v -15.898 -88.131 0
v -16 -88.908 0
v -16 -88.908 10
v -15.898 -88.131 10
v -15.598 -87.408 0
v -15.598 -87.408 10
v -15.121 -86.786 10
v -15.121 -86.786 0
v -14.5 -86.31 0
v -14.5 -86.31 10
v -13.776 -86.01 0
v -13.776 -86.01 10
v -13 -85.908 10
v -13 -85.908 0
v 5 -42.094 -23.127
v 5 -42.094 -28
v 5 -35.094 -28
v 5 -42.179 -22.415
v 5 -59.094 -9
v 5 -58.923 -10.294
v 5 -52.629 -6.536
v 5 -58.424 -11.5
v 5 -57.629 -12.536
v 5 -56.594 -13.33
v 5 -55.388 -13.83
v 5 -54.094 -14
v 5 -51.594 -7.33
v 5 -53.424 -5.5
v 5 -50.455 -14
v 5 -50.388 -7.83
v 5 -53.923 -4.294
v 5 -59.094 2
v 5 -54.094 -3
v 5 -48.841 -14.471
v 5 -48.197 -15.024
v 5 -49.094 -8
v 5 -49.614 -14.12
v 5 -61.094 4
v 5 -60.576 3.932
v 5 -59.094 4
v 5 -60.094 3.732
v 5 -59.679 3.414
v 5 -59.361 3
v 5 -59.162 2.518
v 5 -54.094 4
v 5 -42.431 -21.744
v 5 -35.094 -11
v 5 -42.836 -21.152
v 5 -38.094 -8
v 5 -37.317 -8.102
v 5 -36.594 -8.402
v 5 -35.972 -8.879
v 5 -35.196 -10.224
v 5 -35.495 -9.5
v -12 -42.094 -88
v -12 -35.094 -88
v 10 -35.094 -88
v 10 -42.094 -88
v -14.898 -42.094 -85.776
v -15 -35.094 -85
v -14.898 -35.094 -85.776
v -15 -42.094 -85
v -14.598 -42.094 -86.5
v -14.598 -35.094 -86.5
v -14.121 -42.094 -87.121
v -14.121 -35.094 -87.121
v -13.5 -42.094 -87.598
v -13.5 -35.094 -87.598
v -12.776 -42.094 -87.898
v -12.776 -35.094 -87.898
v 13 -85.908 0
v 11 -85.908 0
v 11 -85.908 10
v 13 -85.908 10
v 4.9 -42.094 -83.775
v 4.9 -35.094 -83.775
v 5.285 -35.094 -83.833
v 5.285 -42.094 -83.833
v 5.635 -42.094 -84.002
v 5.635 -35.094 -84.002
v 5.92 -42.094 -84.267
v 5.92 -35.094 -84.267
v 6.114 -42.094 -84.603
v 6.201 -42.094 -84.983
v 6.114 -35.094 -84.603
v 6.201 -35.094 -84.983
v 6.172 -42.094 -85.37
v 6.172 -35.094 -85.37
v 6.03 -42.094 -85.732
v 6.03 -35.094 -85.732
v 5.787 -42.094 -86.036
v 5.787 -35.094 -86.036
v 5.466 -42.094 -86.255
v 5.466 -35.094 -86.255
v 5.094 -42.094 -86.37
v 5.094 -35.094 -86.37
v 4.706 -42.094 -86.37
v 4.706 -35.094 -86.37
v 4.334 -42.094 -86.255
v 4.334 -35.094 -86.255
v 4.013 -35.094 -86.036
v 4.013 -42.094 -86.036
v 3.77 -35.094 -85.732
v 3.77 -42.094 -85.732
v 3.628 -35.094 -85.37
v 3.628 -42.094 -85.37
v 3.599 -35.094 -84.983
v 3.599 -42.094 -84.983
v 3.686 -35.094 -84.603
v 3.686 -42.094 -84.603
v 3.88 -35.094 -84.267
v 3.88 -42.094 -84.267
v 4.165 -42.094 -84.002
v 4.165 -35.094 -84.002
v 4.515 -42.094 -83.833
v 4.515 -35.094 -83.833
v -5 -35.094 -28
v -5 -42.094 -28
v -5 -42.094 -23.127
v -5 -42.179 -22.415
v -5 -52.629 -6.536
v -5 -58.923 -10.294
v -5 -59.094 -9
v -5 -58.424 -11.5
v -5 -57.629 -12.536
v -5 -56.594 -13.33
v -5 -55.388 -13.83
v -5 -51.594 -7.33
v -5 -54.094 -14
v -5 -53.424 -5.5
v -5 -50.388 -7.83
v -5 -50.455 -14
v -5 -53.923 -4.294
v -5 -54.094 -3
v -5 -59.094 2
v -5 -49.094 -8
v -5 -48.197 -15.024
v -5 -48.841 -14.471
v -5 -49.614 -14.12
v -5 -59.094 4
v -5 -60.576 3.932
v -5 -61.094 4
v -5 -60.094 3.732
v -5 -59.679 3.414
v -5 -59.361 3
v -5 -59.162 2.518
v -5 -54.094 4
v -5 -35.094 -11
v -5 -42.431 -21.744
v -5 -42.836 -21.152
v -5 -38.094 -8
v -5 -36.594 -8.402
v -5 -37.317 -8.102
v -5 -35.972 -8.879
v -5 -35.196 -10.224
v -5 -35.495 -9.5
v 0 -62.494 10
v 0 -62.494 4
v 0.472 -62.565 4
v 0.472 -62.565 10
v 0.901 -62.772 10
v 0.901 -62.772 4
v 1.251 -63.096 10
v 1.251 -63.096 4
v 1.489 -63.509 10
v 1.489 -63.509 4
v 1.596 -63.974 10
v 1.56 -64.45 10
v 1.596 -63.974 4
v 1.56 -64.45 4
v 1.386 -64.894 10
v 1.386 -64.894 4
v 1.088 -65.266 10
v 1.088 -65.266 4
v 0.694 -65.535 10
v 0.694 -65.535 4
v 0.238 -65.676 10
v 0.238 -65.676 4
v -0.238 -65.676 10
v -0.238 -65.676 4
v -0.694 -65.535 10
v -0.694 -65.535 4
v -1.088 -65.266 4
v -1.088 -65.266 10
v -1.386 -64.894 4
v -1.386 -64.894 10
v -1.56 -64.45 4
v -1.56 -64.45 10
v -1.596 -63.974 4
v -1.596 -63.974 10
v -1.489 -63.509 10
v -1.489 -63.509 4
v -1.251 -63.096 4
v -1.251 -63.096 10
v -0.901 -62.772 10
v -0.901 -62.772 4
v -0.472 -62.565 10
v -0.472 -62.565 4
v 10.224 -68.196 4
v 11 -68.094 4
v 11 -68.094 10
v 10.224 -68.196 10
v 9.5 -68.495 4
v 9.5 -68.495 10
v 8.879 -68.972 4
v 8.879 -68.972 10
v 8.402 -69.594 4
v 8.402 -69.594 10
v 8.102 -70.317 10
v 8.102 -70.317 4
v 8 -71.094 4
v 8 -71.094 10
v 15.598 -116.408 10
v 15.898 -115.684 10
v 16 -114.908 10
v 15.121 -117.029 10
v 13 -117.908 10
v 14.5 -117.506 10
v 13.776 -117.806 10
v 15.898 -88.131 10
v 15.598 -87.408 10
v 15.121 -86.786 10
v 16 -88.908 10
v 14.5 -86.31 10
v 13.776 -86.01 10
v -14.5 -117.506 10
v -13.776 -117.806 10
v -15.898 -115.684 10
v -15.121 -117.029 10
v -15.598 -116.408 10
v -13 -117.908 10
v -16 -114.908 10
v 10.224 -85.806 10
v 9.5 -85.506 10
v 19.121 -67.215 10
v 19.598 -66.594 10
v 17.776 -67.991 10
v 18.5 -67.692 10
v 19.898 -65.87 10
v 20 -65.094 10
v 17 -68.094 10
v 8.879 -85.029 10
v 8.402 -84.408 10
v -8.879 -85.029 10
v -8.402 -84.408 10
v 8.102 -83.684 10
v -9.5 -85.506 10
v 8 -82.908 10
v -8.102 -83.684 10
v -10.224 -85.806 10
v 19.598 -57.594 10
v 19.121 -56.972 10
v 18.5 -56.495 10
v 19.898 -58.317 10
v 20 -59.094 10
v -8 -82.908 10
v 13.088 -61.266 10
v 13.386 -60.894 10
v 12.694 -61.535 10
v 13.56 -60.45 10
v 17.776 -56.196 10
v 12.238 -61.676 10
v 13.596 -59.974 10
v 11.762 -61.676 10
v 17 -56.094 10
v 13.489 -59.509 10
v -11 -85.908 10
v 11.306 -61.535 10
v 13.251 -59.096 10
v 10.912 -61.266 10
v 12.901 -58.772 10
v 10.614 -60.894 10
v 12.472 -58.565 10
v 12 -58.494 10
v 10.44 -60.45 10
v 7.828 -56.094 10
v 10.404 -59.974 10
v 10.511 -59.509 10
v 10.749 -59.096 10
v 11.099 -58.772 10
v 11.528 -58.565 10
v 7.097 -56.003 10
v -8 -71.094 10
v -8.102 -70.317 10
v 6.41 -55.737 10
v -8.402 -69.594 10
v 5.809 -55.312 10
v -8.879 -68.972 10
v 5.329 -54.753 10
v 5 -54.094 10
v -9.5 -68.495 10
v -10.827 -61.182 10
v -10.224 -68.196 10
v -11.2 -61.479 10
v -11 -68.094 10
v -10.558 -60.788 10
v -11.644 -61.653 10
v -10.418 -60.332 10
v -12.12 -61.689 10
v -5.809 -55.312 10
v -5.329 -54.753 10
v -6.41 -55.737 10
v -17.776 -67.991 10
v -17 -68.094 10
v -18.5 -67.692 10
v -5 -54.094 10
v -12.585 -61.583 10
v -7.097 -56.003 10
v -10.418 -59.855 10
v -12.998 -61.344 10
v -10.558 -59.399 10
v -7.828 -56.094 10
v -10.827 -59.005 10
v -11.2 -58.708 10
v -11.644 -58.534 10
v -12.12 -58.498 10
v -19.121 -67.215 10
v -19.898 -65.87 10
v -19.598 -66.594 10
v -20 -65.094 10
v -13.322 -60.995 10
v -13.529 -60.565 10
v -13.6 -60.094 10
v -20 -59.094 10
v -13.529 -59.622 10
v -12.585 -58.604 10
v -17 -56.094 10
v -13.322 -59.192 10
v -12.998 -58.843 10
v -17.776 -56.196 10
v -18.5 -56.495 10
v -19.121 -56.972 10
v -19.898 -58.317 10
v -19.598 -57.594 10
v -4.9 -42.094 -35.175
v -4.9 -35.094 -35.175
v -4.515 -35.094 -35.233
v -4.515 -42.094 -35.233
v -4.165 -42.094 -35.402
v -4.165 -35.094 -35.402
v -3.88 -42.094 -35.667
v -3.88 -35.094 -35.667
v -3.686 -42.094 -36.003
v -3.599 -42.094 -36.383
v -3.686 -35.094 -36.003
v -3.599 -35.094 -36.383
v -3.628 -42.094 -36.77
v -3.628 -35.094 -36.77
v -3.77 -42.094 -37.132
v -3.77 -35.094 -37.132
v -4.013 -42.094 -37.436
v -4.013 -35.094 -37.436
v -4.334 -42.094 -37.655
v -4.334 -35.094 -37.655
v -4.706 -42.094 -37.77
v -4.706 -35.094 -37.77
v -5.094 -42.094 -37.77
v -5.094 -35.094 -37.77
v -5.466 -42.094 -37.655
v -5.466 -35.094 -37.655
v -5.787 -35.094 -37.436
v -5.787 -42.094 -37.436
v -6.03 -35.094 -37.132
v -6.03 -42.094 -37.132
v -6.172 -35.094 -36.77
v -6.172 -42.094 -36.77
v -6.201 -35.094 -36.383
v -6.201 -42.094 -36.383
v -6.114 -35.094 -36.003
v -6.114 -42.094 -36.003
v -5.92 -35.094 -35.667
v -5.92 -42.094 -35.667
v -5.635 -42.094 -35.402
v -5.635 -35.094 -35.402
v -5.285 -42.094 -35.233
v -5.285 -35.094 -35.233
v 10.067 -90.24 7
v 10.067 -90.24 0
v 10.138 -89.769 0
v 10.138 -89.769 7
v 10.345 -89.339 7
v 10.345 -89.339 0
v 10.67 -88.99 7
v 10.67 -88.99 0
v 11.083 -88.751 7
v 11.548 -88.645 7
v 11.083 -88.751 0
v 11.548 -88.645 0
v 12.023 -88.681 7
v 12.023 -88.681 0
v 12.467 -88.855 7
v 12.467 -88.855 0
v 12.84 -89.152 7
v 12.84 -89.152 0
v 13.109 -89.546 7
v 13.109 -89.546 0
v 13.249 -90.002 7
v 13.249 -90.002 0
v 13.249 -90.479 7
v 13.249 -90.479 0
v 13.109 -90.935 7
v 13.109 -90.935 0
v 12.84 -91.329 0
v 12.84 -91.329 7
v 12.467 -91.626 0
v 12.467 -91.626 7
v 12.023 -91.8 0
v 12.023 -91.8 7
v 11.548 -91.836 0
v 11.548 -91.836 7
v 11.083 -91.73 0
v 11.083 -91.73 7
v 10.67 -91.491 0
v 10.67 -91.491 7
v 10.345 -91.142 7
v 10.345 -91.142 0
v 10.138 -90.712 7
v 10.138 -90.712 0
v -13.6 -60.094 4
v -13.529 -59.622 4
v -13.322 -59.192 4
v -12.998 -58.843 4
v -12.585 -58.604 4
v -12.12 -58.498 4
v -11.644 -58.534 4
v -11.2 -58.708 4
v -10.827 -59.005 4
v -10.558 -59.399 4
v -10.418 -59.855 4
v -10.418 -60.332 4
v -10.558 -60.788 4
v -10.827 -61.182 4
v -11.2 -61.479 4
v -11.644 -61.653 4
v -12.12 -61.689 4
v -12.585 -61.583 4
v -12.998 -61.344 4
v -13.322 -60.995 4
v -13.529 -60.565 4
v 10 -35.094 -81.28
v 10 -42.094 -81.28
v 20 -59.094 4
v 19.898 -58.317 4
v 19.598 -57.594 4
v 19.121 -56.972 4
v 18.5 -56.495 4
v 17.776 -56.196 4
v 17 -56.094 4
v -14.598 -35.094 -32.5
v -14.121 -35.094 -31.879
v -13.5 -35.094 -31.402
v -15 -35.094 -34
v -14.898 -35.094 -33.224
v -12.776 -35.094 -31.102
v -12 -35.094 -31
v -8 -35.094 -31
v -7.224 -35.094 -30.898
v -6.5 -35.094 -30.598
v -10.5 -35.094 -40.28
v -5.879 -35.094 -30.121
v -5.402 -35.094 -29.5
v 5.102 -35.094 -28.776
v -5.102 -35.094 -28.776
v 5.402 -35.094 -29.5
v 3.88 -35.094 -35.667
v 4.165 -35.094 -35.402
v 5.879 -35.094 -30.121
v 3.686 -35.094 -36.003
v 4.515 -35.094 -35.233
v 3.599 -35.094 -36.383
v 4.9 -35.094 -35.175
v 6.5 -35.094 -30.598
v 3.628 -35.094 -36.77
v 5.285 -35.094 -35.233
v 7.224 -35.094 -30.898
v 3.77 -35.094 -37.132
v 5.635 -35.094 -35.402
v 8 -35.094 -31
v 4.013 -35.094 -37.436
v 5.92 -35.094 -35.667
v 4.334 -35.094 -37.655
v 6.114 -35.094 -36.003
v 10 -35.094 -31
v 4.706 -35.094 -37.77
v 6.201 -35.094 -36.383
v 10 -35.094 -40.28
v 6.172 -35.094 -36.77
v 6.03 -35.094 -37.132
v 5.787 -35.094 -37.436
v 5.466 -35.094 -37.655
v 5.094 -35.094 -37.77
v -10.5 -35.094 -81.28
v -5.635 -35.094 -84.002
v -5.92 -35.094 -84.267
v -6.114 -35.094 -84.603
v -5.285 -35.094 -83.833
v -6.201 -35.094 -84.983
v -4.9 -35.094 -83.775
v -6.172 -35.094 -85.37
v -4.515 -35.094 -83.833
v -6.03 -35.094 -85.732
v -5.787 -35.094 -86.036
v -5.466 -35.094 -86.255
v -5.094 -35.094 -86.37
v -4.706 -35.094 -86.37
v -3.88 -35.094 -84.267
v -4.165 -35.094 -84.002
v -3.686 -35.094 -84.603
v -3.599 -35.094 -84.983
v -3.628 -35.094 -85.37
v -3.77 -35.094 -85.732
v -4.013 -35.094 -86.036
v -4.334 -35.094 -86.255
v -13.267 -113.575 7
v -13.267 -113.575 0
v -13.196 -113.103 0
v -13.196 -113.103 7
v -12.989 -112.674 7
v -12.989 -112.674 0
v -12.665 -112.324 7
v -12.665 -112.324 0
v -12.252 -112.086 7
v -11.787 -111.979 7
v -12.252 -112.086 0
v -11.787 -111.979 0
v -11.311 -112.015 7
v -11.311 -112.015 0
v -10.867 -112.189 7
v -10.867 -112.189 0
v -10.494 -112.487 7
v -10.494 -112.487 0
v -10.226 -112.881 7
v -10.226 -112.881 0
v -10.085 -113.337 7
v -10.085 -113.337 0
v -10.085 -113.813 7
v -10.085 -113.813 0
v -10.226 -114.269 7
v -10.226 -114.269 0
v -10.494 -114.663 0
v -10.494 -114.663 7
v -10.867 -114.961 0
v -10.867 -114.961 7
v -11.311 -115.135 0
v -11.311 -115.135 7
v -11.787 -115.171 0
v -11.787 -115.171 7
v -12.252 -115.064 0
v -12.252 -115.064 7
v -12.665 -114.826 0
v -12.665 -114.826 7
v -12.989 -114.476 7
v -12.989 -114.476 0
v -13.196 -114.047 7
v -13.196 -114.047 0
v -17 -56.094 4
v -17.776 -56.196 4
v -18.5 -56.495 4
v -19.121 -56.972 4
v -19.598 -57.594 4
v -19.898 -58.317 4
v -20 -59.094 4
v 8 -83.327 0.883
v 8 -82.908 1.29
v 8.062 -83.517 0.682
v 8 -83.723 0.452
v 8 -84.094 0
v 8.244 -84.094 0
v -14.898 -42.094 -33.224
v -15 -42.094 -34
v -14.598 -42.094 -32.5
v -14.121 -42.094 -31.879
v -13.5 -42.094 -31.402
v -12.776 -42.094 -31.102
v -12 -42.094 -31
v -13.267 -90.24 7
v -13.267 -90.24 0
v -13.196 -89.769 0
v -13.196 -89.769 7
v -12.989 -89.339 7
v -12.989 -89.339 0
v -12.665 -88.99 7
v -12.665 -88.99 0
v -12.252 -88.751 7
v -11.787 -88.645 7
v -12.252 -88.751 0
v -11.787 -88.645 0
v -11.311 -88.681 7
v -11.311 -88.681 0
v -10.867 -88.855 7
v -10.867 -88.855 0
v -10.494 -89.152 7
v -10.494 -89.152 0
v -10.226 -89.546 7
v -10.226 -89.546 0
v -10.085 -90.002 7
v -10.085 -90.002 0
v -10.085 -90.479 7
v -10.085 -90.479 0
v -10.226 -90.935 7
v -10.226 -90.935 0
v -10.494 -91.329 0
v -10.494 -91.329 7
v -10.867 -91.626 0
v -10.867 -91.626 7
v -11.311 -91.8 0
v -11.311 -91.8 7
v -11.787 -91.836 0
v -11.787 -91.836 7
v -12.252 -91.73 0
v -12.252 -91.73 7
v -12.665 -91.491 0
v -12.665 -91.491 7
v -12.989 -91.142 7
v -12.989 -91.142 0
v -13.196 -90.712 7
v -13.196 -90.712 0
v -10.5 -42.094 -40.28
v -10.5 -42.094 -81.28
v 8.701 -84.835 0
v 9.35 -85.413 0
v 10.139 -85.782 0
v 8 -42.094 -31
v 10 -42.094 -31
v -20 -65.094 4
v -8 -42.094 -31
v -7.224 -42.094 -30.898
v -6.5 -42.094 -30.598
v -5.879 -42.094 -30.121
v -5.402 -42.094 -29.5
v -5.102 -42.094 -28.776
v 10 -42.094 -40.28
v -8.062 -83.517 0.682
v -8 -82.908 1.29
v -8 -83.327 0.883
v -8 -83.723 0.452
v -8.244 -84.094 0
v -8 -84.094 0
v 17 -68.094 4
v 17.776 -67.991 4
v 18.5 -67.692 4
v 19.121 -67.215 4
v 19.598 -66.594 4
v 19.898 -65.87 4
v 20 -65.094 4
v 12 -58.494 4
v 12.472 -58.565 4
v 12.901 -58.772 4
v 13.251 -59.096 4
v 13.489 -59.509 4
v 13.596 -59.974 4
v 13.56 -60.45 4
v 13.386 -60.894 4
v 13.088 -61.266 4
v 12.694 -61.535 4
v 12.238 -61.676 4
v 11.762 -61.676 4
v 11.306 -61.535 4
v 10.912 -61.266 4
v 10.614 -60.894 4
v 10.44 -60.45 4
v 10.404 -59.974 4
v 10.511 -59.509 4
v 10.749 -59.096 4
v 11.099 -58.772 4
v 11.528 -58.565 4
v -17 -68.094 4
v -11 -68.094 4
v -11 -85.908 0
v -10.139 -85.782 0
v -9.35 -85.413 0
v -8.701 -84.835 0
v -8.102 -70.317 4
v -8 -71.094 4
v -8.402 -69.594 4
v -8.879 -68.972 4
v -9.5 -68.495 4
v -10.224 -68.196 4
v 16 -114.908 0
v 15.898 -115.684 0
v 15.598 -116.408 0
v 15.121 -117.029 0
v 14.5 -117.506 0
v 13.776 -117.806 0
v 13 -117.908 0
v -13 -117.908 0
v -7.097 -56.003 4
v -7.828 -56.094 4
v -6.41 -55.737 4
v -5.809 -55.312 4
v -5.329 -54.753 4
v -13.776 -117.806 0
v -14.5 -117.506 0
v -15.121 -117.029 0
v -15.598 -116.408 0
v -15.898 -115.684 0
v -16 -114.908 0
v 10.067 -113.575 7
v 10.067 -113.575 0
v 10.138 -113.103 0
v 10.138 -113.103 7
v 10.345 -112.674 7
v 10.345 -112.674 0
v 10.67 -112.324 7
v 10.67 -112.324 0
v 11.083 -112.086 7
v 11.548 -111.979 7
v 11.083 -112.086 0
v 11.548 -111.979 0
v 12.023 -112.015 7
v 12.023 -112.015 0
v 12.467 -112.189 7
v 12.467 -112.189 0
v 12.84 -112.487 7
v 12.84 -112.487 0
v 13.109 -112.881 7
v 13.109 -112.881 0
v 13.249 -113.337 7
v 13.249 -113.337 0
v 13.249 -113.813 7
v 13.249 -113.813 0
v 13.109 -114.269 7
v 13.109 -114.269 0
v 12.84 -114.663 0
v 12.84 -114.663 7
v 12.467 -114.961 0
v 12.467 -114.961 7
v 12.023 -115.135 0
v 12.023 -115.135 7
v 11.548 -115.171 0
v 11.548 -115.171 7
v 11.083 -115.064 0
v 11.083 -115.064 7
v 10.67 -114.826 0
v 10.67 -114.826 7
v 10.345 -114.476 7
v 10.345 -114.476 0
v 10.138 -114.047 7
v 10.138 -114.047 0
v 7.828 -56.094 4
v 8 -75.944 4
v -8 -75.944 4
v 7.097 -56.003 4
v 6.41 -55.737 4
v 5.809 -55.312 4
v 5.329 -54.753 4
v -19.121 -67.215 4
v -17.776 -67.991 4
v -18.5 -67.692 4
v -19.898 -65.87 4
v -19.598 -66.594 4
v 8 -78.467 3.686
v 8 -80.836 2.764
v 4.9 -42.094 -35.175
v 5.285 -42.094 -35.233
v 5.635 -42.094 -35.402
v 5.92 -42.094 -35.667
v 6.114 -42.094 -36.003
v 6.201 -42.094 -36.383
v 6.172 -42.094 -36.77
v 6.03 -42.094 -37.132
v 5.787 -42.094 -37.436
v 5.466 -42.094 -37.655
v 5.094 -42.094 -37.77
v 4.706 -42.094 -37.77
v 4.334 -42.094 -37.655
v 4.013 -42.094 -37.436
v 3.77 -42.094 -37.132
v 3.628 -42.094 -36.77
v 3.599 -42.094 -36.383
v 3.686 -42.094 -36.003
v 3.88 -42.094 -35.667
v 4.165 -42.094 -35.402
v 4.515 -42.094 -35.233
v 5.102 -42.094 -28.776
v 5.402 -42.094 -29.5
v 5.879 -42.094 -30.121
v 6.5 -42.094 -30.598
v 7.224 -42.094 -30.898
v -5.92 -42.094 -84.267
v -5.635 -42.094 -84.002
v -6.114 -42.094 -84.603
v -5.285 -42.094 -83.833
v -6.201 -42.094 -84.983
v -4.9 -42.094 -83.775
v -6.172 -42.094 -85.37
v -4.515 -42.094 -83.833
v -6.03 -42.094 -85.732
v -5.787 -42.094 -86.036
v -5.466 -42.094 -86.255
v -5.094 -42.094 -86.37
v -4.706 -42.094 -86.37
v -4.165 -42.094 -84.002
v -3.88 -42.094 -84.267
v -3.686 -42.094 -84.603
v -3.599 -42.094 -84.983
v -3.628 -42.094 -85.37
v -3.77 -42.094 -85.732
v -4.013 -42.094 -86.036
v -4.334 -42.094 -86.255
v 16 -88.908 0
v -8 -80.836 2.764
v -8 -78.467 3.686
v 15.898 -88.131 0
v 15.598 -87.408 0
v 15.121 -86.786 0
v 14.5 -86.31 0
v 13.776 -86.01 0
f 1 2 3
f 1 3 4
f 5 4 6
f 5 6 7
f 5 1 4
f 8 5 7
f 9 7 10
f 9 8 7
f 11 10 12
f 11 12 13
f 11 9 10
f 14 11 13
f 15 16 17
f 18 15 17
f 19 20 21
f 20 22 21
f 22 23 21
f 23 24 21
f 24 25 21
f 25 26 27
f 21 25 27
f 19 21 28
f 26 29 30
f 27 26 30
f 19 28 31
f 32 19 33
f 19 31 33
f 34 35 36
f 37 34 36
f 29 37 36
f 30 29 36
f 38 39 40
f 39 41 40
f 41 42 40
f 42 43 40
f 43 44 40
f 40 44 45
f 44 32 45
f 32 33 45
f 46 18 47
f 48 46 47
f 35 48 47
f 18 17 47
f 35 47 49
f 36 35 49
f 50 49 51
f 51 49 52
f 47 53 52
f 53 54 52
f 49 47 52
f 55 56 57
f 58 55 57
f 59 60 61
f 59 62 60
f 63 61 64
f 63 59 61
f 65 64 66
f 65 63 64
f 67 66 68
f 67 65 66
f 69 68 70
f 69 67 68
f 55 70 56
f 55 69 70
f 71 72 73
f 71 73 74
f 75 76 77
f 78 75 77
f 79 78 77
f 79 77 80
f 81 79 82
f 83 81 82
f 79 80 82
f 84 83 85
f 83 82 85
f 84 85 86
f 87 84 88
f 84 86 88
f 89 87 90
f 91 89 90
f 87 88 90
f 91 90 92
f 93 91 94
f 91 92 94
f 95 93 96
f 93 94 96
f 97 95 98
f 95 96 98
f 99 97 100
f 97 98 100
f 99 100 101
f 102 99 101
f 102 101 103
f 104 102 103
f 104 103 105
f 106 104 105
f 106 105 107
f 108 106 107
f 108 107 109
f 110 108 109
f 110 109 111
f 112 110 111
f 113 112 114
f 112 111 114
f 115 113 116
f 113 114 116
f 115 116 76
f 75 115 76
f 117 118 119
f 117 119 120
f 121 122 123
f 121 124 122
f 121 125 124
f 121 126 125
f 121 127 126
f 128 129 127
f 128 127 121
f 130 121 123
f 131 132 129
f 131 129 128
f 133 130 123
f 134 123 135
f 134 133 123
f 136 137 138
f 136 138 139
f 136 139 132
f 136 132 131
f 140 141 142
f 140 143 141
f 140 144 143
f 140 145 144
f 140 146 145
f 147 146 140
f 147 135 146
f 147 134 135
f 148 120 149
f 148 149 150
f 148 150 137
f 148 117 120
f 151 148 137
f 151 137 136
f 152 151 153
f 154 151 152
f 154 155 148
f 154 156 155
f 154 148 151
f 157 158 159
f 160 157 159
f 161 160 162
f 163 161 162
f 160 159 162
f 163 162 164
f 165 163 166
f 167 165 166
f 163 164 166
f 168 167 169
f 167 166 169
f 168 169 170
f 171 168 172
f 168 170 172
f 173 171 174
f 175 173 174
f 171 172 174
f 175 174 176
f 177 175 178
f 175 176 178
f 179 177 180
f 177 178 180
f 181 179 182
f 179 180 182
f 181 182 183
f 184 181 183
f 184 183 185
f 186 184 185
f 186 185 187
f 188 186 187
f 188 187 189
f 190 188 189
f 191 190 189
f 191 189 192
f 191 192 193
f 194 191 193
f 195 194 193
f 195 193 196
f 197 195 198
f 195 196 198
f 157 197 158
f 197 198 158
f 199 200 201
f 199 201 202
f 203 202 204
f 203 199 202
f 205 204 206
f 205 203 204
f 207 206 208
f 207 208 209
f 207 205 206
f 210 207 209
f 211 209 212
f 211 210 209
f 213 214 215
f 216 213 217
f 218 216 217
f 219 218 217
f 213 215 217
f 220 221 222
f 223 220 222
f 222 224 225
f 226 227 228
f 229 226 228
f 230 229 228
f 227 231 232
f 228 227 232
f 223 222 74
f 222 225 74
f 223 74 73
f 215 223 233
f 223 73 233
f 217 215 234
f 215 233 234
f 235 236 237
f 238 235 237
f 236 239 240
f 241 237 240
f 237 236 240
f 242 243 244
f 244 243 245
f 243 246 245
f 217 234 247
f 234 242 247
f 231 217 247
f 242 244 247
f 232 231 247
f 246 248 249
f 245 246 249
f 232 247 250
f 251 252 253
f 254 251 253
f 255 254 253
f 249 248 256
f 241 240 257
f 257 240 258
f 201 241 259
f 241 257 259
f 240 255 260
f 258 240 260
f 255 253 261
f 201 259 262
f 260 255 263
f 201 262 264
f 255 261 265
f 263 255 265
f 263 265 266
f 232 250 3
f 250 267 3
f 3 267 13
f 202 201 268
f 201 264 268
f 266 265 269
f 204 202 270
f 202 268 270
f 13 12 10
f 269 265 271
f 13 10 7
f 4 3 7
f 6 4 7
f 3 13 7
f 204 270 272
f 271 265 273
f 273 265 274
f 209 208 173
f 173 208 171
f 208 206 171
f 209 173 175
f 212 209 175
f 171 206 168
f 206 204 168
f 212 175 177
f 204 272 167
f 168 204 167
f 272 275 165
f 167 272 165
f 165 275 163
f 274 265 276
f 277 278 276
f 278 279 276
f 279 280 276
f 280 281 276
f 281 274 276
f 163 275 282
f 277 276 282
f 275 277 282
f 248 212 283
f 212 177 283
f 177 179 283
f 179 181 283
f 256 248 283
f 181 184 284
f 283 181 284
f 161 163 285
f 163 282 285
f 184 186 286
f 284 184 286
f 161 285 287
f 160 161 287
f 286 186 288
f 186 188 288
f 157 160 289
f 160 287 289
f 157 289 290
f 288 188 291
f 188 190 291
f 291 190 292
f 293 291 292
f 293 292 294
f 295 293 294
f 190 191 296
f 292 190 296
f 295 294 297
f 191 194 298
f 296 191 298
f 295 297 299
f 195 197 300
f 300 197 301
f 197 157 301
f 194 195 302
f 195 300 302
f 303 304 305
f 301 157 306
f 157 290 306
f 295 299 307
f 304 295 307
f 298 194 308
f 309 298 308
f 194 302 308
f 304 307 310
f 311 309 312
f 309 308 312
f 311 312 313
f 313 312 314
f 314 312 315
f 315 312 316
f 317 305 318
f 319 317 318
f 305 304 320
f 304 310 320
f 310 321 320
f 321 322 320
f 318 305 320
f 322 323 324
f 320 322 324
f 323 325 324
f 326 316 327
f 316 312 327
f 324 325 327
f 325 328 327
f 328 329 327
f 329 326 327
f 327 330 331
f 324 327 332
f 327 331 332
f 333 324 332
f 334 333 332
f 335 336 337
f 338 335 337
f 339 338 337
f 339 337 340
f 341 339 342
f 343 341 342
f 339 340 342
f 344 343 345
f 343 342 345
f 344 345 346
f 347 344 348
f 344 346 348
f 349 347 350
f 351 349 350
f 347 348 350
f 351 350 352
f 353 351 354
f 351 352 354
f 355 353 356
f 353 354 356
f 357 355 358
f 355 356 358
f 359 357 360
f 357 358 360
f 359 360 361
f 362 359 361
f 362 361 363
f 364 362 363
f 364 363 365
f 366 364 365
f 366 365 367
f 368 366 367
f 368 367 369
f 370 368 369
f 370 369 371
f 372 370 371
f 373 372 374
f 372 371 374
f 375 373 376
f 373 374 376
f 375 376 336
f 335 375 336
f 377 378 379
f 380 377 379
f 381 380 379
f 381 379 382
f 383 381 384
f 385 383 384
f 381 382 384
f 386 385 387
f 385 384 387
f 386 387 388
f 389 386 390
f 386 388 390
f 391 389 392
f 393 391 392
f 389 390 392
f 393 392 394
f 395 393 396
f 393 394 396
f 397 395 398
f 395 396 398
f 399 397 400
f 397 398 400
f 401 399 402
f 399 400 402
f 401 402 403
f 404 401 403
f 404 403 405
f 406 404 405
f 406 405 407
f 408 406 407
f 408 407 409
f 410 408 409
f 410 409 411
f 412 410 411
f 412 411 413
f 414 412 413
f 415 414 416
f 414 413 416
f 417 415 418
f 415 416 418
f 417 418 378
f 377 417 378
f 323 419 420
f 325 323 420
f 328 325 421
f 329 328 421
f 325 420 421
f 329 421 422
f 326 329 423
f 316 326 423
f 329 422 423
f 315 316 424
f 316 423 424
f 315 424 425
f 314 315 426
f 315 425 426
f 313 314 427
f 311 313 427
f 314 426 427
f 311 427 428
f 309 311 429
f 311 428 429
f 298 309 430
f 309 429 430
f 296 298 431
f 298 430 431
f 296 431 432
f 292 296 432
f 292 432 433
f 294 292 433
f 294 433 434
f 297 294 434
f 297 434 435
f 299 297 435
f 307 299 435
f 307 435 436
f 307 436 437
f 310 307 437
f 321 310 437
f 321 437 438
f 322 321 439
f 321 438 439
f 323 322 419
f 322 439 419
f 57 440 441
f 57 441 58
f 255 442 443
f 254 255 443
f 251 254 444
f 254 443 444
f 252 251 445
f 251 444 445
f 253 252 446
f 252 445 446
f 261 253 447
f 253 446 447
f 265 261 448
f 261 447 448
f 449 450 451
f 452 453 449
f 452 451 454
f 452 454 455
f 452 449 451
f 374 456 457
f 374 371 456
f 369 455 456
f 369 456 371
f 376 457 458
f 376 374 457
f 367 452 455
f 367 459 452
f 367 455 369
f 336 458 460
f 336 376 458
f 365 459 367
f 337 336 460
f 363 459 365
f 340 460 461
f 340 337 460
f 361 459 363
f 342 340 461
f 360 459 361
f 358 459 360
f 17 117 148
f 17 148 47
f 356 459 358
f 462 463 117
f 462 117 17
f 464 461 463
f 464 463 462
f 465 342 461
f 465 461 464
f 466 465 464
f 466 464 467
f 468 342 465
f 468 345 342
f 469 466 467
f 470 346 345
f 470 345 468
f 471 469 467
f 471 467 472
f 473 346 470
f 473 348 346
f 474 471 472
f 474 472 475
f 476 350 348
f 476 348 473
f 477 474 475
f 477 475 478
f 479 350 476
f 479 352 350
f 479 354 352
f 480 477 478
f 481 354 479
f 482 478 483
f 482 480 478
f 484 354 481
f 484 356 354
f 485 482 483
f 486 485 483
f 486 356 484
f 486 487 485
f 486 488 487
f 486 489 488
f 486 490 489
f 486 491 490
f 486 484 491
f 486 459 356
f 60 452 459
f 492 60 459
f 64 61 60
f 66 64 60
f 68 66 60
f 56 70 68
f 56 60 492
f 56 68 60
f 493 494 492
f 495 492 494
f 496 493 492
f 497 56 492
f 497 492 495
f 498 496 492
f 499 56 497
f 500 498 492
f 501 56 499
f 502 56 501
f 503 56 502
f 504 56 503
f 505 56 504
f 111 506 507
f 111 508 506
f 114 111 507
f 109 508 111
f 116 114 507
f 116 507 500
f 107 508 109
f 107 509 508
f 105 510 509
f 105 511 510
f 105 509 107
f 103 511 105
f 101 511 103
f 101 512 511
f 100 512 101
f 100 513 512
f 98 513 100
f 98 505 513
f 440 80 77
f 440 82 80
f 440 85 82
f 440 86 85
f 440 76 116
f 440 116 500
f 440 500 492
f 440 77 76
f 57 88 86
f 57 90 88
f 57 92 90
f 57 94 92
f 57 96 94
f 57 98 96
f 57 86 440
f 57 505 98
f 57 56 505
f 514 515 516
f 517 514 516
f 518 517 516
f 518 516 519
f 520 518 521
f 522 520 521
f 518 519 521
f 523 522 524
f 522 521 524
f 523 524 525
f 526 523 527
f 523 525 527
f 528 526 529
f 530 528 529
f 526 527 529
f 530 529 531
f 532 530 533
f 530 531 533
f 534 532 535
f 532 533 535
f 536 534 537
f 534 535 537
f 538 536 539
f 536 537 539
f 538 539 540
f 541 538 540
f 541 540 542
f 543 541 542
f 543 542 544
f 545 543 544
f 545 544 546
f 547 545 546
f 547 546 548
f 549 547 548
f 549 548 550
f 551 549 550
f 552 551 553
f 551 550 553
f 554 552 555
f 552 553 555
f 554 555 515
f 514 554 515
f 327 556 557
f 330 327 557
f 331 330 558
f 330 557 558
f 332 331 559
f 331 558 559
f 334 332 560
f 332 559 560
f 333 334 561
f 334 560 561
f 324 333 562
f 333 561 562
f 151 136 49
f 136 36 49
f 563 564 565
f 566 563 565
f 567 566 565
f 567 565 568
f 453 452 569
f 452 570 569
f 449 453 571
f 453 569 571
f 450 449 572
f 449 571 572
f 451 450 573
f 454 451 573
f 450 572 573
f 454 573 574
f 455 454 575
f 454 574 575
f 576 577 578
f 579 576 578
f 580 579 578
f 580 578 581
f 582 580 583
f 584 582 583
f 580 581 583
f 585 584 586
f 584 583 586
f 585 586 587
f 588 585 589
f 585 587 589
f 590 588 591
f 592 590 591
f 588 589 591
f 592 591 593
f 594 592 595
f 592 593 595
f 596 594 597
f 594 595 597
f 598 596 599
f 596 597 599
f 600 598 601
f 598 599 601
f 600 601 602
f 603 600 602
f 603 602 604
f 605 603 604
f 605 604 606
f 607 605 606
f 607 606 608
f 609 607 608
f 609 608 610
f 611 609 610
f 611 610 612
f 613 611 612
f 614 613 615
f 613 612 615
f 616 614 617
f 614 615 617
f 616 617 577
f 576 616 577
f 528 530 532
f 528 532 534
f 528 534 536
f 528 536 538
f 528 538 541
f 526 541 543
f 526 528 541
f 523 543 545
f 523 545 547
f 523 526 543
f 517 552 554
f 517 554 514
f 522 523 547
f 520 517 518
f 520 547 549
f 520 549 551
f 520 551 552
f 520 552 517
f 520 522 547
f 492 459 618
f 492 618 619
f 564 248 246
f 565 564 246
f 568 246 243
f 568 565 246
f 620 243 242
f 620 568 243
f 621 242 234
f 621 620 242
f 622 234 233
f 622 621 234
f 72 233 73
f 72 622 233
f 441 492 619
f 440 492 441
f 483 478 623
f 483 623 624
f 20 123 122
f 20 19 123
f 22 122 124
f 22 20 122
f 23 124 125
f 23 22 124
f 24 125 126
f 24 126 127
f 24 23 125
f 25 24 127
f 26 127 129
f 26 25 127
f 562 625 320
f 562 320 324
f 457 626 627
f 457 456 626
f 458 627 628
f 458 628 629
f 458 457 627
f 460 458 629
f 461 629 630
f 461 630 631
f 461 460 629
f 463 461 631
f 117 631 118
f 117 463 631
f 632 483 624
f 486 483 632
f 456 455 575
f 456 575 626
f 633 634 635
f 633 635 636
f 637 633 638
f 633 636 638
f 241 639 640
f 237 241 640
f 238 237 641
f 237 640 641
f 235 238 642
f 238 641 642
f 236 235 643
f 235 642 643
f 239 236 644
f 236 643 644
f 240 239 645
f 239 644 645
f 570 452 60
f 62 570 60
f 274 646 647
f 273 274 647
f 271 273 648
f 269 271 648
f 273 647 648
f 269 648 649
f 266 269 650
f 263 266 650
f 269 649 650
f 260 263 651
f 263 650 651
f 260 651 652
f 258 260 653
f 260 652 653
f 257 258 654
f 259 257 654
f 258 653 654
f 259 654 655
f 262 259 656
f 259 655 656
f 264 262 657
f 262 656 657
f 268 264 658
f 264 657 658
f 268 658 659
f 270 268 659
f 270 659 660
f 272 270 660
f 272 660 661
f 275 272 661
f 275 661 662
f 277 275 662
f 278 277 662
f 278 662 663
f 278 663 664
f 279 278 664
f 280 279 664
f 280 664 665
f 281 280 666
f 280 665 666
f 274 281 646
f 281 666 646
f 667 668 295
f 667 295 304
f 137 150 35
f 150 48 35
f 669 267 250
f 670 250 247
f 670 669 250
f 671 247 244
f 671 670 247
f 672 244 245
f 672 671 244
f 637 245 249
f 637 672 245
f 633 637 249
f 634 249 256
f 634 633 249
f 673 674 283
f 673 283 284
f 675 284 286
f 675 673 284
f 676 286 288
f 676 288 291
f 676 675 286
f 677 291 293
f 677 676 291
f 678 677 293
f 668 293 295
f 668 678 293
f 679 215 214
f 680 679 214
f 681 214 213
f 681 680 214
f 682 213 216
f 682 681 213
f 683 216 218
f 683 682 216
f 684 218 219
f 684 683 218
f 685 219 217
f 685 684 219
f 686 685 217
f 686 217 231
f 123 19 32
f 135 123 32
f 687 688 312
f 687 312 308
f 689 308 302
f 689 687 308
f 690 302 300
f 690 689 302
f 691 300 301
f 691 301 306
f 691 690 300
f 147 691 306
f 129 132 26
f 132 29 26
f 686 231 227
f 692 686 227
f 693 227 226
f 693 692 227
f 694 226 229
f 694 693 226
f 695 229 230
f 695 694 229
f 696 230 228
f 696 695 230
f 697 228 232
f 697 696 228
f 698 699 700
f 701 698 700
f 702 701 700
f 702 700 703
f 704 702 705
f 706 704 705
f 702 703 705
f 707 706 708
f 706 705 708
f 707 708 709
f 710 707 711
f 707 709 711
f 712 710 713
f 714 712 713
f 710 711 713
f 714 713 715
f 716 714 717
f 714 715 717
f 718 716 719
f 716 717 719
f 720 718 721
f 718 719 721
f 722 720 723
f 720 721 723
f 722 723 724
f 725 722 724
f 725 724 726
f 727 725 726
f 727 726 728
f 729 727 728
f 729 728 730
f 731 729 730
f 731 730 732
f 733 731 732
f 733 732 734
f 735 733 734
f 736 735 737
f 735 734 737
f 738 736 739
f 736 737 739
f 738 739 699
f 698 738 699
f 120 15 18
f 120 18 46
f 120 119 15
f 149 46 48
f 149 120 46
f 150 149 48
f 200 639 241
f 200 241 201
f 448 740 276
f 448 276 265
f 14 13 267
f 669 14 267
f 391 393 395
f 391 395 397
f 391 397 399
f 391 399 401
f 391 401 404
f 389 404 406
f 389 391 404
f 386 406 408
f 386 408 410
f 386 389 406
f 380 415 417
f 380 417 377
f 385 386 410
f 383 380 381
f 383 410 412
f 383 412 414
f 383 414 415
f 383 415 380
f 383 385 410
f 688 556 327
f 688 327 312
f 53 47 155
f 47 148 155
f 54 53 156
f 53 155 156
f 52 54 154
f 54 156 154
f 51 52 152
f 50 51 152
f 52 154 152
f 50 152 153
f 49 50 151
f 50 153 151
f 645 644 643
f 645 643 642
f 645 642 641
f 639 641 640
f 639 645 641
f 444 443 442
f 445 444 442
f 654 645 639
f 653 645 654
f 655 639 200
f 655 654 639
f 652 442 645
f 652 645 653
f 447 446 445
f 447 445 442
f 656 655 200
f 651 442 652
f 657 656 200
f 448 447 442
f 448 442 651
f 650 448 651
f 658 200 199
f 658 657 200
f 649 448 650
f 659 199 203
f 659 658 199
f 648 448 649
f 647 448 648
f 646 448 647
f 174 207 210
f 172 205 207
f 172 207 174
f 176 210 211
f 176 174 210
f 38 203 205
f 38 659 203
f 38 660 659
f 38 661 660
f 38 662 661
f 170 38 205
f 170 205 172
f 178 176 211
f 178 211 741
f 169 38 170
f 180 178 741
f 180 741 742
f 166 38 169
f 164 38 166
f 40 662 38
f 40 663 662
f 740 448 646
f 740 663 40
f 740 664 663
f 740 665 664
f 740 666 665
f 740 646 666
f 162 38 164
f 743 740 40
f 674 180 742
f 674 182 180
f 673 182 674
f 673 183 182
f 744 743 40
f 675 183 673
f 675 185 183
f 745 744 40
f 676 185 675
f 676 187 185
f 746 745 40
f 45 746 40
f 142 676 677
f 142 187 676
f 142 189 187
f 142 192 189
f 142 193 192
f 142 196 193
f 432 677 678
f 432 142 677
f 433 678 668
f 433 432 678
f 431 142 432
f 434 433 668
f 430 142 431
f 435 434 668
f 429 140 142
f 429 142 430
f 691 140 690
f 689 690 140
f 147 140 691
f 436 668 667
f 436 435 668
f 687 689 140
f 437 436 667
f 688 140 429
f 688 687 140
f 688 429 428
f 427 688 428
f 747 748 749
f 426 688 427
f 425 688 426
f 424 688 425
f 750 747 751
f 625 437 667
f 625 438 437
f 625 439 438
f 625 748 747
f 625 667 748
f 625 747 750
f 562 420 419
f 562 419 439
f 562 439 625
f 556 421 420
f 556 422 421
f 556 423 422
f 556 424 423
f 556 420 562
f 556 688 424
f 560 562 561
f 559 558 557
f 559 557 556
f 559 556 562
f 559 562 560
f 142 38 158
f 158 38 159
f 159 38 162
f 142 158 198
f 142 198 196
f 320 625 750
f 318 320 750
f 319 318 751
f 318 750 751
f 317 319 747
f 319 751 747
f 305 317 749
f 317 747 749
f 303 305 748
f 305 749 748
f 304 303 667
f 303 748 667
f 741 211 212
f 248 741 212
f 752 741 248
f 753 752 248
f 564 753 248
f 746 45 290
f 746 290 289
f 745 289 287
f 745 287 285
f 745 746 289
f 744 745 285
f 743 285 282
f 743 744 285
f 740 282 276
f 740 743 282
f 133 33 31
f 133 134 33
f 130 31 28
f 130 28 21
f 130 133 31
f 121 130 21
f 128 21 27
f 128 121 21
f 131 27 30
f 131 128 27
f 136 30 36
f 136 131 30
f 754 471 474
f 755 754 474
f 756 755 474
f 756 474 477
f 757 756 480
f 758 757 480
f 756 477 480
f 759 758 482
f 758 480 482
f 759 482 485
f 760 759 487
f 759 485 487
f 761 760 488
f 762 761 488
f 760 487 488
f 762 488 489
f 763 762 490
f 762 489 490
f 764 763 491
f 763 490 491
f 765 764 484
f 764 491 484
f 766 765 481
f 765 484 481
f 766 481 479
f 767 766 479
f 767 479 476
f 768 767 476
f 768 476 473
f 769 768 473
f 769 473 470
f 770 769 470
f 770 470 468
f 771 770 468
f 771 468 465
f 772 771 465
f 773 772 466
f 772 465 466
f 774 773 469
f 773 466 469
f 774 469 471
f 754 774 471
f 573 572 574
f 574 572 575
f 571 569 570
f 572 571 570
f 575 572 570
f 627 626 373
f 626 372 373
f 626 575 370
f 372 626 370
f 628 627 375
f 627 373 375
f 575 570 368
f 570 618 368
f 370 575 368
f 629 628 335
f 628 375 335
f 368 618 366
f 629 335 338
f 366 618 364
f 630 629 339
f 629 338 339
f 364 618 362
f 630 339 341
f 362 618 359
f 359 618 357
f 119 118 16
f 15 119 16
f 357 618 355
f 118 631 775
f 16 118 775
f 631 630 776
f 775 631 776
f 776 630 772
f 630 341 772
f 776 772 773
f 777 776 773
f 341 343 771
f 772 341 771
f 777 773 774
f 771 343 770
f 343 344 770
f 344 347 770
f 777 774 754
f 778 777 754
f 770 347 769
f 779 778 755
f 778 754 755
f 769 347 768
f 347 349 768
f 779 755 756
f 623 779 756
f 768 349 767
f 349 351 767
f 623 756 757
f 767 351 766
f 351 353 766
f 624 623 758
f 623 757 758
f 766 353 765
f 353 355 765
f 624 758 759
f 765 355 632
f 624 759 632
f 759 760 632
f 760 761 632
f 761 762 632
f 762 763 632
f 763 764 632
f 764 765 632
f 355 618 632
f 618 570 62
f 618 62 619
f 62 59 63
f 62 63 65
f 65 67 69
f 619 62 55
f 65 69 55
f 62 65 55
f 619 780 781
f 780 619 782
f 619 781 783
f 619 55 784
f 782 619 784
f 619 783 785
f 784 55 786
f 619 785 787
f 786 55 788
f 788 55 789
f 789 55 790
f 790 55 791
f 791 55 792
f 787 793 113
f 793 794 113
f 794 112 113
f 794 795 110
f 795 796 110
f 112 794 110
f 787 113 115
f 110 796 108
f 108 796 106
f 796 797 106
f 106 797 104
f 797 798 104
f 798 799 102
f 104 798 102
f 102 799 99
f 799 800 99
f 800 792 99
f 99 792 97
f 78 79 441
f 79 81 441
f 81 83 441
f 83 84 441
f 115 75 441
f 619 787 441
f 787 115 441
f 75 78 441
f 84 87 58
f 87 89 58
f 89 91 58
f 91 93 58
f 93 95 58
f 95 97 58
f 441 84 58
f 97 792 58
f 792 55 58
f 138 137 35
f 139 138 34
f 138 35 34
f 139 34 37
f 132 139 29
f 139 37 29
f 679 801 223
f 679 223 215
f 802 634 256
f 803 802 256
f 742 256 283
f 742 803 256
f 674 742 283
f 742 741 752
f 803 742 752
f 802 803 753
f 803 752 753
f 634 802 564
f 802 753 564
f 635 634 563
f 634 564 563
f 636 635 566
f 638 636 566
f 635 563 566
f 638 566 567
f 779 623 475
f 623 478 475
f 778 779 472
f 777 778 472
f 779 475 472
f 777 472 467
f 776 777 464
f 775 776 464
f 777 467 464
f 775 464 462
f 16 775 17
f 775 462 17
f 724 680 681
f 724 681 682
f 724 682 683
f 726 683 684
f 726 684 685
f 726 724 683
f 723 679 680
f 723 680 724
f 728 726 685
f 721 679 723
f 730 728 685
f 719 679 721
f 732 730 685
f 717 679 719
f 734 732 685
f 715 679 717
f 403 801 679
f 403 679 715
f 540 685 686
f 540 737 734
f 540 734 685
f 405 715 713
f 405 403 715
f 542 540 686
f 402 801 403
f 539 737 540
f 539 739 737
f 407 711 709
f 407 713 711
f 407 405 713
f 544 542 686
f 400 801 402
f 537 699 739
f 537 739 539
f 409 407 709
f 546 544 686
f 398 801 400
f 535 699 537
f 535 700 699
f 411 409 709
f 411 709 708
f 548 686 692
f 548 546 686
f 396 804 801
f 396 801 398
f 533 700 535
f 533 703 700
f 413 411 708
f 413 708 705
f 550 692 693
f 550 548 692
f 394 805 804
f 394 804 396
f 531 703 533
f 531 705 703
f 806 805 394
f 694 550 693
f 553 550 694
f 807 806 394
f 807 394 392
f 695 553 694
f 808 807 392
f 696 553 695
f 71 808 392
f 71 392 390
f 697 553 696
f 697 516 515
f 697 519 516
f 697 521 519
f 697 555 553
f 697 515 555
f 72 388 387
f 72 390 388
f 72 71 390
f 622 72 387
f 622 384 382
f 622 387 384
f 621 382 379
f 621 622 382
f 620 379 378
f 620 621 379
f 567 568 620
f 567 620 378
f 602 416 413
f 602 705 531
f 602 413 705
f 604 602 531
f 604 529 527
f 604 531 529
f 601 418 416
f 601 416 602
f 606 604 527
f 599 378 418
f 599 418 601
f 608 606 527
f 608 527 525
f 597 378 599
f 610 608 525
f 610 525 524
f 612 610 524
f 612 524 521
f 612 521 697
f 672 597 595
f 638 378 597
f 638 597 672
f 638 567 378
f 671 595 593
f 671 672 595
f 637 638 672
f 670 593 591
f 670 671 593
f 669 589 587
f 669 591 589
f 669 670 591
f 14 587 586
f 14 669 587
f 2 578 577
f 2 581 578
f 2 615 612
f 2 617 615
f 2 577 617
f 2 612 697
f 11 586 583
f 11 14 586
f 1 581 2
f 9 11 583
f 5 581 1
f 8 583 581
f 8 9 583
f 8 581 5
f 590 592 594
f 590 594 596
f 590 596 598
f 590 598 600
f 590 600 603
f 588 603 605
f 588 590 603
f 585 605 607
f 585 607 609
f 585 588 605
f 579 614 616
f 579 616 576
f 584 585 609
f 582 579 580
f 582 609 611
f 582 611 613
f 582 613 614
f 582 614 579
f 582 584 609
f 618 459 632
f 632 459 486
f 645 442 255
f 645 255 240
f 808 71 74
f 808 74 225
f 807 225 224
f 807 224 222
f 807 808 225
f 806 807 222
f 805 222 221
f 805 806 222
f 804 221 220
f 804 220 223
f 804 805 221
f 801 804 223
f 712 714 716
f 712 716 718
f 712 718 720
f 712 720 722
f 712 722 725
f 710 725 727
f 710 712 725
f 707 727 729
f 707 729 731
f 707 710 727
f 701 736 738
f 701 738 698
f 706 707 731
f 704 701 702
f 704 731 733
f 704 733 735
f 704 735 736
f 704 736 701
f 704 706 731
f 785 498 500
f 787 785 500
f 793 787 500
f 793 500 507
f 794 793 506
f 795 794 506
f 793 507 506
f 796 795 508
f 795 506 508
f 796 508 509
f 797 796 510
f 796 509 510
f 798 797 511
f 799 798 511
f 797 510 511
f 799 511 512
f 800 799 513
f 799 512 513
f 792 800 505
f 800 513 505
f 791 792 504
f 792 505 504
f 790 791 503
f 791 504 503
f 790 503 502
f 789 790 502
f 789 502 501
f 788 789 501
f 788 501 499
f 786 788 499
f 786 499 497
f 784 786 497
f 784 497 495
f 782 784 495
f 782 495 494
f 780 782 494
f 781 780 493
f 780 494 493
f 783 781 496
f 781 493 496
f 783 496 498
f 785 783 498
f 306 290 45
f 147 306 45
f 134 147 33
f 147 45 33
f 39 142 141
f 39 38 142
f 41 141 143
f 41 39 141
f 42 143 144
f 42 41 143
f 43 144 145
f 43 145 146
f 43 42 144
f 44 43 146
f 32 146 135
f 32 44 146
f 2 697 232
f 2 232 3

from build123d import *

# Parameters (mm, degrees)
BOSS_EXTRUDE1_DEPTH = 10
CUT_EXTRUDE1_REACH  = 126.909
FILLET1_R           = 3
SKETCH3_R           = 1.6
CUT_EXTRUDE2_DEPTH  = 6
SKETCH4_R           = 1.6
CUT_EXTRUDE3_DEPTH  = 7
BOSS_EXTRUDE2_DEPTH = 5
FILLET2_R           = 3
FILLET3_R           = 2
FILLET4_R           = 5
FILLET5_R           = 3
SKETCH7_W           = 25
SKETCH7_H           = 57
BOSS_EXTRUDE3_DEPTH = 7
SKETCH8_R           = 1.304654563
SKETCH8_W           = 21.294220064
SKETCH8_H           = 41
CUT_EXTRUDE4_DEPTH  = 7
FILLET6_R           = 3


with BuildPart() as part:
    # Sketch1 → Boss-Extrude1 (new body)
    with BuildSketch(Plane.XY):
        with BuildLine():
            Line((-13, -85.907758216), (-8, -85.907758216))
            Line((-8, -85.907758216), (-8, -68.093529717))
            Line((-8, -68.093529717), (-20, -68.093529717))
            Line((-20, -68.093529717), (-20, -56.093529717))
            Line((-20, -56.093529717), (20, -56.093529717))
            Line((20, -56.093529717), (20, -68.093529717))
            Line((20, -68.093529717), (8, -68.093529717))
            Line((8, -68.093529717), (8, -85.907758216))
            Line((8, -85.907758216), (13, -85.907758216))
            ThreePointArc((13, -85.907758216), (15.121320344, -86.786437873), (16, -88.907758216))
            Line((16, -88.907758216), (16, -114.907758216))
            ThreePointArc((16, -114.907758216), (15.121320344, -117.02907856), (13, -117.907758216))
            Line((13, -117.907758216), (-13, -117.907758216))
            ThreePointArc((-13, -117.907758216), (-15.121320344, -117.02907856), (-16, -114.907758216))
            Line((-16, -114.907758216), (-16, -88.907758216))
            ThreePointArc((-16, -88.907758216), (-15.121320344, -86.786437873), (-13, -85.907758216))
        make_face()
    extrude(amount=BOSS_EXTRUDE1_DEPTH)

    # Cut-Extrude1: up to this face of the body (flat: up to its plane)
    cut_extrude1_end = Plane(part.part.faces().sort_by_distance((-20, -62.093529717, 5))[0])
    # Sketch2 → Cut-Extrude1 (cut, up to the picked face)
    with BuildSketch(Plane(origin=(20, 0, 0), x_dir=(0, 0, -1), z_dir=(1, 0, 0)), mode=Mode.PRIVATE) as cut_extrude1_sk1:
        with BuildLine():
            Line((-4, -56.093529717), (-4, -75.944087362))
            ThreePointArc((-4, -75.944087362), (-2.946090025, -80.483178975), (0, -84.093529717))
            Line((0, -84.093529717), (0, -56.093529717))
            Line((0, -56.093529717), (-4, -56.093529717))
        make_face()
    cut_extrude1_tool1 = split(extrude(cut_extrude1_sk1.sketch, amount=-CUT_EXTRUDE1_REACH, mode=Mode.PRIVATE), bisect_by=cut_extrude1_end, keep=Keep.BOTH, mode=Mode.PRIVATE)
    add(cut_extrude1_tool1.solids().sort_by(Axis((20, -68.93128, 1.917617), (-1, 0, 0)))[0], mode=Mode.SUBTRACT)

    # Fillet1
    # the kernel refuses this fillet: 3 mm, written as the material it adds along each edge
    with BuildSketch(Plane(origin=(-8, -68.093529717, 4), x_dir=(0, -1, 0), z_dir=(0, 0, 1))) as fillet1_piece_1:
        with BuildLine():
            CenterArc((FILLET1_R, -FILLET1_R), FILLET1_R, 90, 90)
            Line((0, -FILLET1_R), (0, 0))
            Line((0, 0), (FILLET1_R, 0))
        make_face()
    extrude(amount=6)
    with BuildSketch(Plane(origin=(8, -68.093529717, 4), x_dir=(0, -1, 0), z_dir=(0, 0, 1))) as fillet1_piece_2:
        with BuildLine():
            CenterArc((FILLET1_R, FILLET1_R), FILLET1_R, 180, 90)
            Line((0, FILLET1_R), (0, 0))
            Line((0, 0), (FILLET1_R, 0))
        make_face()
    extrude(amount=6)
    with BuildSketch(Plane(origin=(-8, -85.907758216, 0), x_dir=(-1, 0, 0), z_dir=(0, 0, 1))) as fillet1_piece_3_section:
        with BuildLine():
            CenterArc((FILLET1_R, -FILLET1_R), FILLET1_R, 90, 90)
            Line((0, -FILLET1_R), (0, 0))
            Line((0, 0), (FILLET1_R, 0))
        make_face()
    fillet1_piece_3 = extrude(amount=10, mode=Mode.PRIVATE)
    fillet1_piece_3 = fillet1_piece_3 - Plane(origin=(-8.681614659, -75.944087362, -6.301676338), x_dir=(0, 0, 1), z_dir=(1, 0, 0)) * Cylinder(10.301676338, 32, mode=Mode.PRIVATE)
    add(fillet1_piece_3)
    with BuildSketch(Plane(origin=(8, -85.907758216, 0), x_dir=(1, 0, 0), z_dir=(0, 0, 1))) as fillet1_piece_4_section:
        with BuildLine():
            CenterArc((FILLET1_R, FILLET1_R), FILLET1_R, 180, 90)
            Line((0, FILLET1_R), (0, 0))
            Line((0, 0), (FILLET1_R, 0))
        make_face()
    fillet1_piece_4 = extrude(amount=10, mode=Mode.PRIVATE)
    fillet1_piece_4 = fillet1_piece_4 - Plane(origin=(8.68161466, -75.944087362, -6.301676338), x_dir=(0, 0, 1), z_dir=(1, 0, 0)) * Cylinder(10.301676338, 32, mode=Mode.PRIVATE)
    add(fillet1_piece_4)
    # the kernel refuses this fillet: 3 mm, written as the material it takes off along each edge
    with BuildSketch(Plane(origin=(-20, -68.093529717, -3.5), x_dir=(0, 1, 0), z_dir=(0, 0, 1)), Plane(origin=(-20, -56.093529717, -3.5), x_dir=(1, 0, 0), z_dir=(0, 0, 1)), Plane(origin=(20, -56.093529717, -3.5), x_dir=(0, -1, 0), z_dir=(0, 0, 1)), Plane(origin=(20, -68.093529717, -3.5), x_dir=(-1, 0, 0), z_dir=(0, 0, 1))) as fillet1_2_piece_1:
        with BuildLine():
            CenterArc((FILLET1_R, -FILLET1_R), FILLET1_R, 90, 90)
            Line((0, -FILLET1_R), (0, 0))
            Line((0, 0), (FILLET1_R, 0))
        make_face()
    extrude(amount=21, mode=Mode.SUBTRACT)

    # Sketch3 → Cut-Extrude2 (cut)
    with BuildSketch(Plane(origin=(0, 0, 4), x_dir=(-1, 0, 0), z_dir=(0, 0, -1))):
        with Locations(Location((-12, -60.093529717, 0), (0, 0, 90))):
            Circle(SKETCH3_R)
        with Locations(Location((0, -64.093529717, 0), (0, 0, 90))):
            Circle(SKETCH3_R)
        with Locations((12, -60.093529717)):
            Circle(SKETCH3_R)
    extrude(amount=-CUT_EXTRUDE2_DEPTH, mode=Mode.SUBTRACT)

    # Sketch4 → Cut-Extrude3 (cut)
    with BuildSketch(Plane(origin=(0, 0, 0), x_dir=(-1, 0, 0), z_dir=(0, 0, -1))):
        with Locations((11.66726189, -90.240496327)):
            Circle(SKETCH4_R)
        with Locations((-11.66726189, -90.240496327)):
            Circle(SKETCH4_R)
        with Locations((-11.66726189, -113.575020106)):
            Circle(SKETCH4_R)
        with Locations((11.66726189, -113.575020106)):
            Circle(SKETCH4_R)
    extrude(amount=-CUT_EXTRUDE3_DEPTH, mode=Mode.SUBTRACT)

    # Sketch5 → Boss-Extrude2 (add, symmetric)
    with BuildSketch(Plane(origin=(0, 0, 0), x_dir=(0, 0, -1), z_dir=(1, 0, 0))):
        Polygon((-10, -59.093529717), (-10, -54.093529717), (8, -54.093529717), (8, -35.093529717), (88, -35.093529717), (88, -42.093529717), (22, -42.093529717), (14, -49.093529717), (14, -59.093529717), align=None)
    extrude(amount=BOSS_EXTRUDE2_DEPTH, both=True)

    # Fillet2
    # the kernel refuses this fillet: 3 mm, written as the material it adds along each edge
    with BuildSketch(Plane(origin=(-5, -56.093529717, 4), x_dir=(-1, 0, 0), z_dir=(0, 0, 1))) as fillet2_piece_1:
        with BuildLine():
            CenterArc((2.828427125, -3), FILLET2_R, 90, 70.528779366)
            Line((0, -2), (-0.056568542, -1.98))
            ThreePointArc((-0.056568542, -1.98), (-0.06, -1), (-0.06, 0))
            Line((-0.06, 0), (0, 0.06))
            Line((0, 0.06), (2.828427125, 0.06))
            Line((2.828427125, 0.06), (2.828427125, 0))
        make_face()
    extrude(amount=6)
    with BuildSketch(Plane(origin=(5, -56.093529717, 4), x_dir=(1, 0, 0), z_dir=(0, 0, 1))) as fillet2_piece_2:
        with BuildLine():
            CenterArc((2.828427125, 3), FILLET2_R, 199.471220634, 70.528779366)
            Line((0, 2), (-0.056568542, 1.98))
            ThreePointArc((-0.056568542, 1.98), (-0.06, 1), (-0.06, 0))
            Line((-0.06, 0), (0, -0.06))
            Line((0, -0.06), (2.828427125, -0.06))
            Line((2.828427125, -0.06), (2.828427125, 0))
        make_face()
    extrude(amount=6)

    # Fillet3
    fillet3_edges = [part.edges().sort_by_distance(p)[0] for p in [
        (0, -59.093529717, 4),
    ]]
    fillet(fillet3_edges, radius=FILLET3_R)

    # Fillet4
    fillet4_edges = [part.edges().sort_by_distance(p)[0] for p in [
        (0, -59.093529717, -14),
        (0, -54.093529717, -8),
    ]]
    fillet(fillet4_edges, radius=FILLET4_R)

    # Fillet5
    fillet5_edges = [part.edges().sort_by_distance(p)[0] for p in [
        (0, -35.093529717, -8),
    ]]
    fillet(fillet5_edges, radius=FILLET5_R)

    # Sketch7 → Boss-Extrude3 (add)
    with BuildSketch(Plane(origin=(0, -35.093529717, 0), x_dir=(1, 0, 0), z_dir=(0, 1, 0))):
        with Locations((-2.5, 59.5)):
            Rectangle(SKETCH7_W, SKETCH7_H)
    extrude(amount=-BOSS_EXTRUDE3_DEPTH)

    # Sketch8 → Cut-Extrude4 (cut)
    with BuildSketch(Plane(origin=(0, -35.093529717, 0), x_dir=(1, 0, 0), z_dir=(0, 1, 0))):
        with Locations(Location((-4.9, 85.08, 0), (0, 0, 270))):
            Circle(SKETCH8_R)
        with Locations(Location((4.9, 85.08, 0), (0, 0, 270))):
            Circle(SKETCH8_R)
        with Locations(Location((4.9, 36.48, 0), (0, 0, 270))):
            Circle(SKETCH8_R)
        with Locations(Location((-4.9, 36.48, 0), (0, 0, 270))):
            Circle(SKETCH8_R)
        with Locations((0.147110032, 60.78)):
            Rectangle(SKETCH8_W, SKETCH8_H)
    extrude(amount=-CUT_EXTRUDE4_DEPTH, mode=Mode.SUBTRACT)

    # Fillet6
    fillet6_edges = [part.edges().sort_by_distance(p)[0] for p in [
        (0, -49.093529717, -14),
        (0, -42.093529717, -22),
        (5, -38.593529717, -31),
        (-5, -38.593529717, -31),
        (-15, -38.593529717, -31),
        (-15, -38.593529717, -88),
    ]]
    fillet(fillet6_edges, radius=FILLET6_R)


solid = part.part
